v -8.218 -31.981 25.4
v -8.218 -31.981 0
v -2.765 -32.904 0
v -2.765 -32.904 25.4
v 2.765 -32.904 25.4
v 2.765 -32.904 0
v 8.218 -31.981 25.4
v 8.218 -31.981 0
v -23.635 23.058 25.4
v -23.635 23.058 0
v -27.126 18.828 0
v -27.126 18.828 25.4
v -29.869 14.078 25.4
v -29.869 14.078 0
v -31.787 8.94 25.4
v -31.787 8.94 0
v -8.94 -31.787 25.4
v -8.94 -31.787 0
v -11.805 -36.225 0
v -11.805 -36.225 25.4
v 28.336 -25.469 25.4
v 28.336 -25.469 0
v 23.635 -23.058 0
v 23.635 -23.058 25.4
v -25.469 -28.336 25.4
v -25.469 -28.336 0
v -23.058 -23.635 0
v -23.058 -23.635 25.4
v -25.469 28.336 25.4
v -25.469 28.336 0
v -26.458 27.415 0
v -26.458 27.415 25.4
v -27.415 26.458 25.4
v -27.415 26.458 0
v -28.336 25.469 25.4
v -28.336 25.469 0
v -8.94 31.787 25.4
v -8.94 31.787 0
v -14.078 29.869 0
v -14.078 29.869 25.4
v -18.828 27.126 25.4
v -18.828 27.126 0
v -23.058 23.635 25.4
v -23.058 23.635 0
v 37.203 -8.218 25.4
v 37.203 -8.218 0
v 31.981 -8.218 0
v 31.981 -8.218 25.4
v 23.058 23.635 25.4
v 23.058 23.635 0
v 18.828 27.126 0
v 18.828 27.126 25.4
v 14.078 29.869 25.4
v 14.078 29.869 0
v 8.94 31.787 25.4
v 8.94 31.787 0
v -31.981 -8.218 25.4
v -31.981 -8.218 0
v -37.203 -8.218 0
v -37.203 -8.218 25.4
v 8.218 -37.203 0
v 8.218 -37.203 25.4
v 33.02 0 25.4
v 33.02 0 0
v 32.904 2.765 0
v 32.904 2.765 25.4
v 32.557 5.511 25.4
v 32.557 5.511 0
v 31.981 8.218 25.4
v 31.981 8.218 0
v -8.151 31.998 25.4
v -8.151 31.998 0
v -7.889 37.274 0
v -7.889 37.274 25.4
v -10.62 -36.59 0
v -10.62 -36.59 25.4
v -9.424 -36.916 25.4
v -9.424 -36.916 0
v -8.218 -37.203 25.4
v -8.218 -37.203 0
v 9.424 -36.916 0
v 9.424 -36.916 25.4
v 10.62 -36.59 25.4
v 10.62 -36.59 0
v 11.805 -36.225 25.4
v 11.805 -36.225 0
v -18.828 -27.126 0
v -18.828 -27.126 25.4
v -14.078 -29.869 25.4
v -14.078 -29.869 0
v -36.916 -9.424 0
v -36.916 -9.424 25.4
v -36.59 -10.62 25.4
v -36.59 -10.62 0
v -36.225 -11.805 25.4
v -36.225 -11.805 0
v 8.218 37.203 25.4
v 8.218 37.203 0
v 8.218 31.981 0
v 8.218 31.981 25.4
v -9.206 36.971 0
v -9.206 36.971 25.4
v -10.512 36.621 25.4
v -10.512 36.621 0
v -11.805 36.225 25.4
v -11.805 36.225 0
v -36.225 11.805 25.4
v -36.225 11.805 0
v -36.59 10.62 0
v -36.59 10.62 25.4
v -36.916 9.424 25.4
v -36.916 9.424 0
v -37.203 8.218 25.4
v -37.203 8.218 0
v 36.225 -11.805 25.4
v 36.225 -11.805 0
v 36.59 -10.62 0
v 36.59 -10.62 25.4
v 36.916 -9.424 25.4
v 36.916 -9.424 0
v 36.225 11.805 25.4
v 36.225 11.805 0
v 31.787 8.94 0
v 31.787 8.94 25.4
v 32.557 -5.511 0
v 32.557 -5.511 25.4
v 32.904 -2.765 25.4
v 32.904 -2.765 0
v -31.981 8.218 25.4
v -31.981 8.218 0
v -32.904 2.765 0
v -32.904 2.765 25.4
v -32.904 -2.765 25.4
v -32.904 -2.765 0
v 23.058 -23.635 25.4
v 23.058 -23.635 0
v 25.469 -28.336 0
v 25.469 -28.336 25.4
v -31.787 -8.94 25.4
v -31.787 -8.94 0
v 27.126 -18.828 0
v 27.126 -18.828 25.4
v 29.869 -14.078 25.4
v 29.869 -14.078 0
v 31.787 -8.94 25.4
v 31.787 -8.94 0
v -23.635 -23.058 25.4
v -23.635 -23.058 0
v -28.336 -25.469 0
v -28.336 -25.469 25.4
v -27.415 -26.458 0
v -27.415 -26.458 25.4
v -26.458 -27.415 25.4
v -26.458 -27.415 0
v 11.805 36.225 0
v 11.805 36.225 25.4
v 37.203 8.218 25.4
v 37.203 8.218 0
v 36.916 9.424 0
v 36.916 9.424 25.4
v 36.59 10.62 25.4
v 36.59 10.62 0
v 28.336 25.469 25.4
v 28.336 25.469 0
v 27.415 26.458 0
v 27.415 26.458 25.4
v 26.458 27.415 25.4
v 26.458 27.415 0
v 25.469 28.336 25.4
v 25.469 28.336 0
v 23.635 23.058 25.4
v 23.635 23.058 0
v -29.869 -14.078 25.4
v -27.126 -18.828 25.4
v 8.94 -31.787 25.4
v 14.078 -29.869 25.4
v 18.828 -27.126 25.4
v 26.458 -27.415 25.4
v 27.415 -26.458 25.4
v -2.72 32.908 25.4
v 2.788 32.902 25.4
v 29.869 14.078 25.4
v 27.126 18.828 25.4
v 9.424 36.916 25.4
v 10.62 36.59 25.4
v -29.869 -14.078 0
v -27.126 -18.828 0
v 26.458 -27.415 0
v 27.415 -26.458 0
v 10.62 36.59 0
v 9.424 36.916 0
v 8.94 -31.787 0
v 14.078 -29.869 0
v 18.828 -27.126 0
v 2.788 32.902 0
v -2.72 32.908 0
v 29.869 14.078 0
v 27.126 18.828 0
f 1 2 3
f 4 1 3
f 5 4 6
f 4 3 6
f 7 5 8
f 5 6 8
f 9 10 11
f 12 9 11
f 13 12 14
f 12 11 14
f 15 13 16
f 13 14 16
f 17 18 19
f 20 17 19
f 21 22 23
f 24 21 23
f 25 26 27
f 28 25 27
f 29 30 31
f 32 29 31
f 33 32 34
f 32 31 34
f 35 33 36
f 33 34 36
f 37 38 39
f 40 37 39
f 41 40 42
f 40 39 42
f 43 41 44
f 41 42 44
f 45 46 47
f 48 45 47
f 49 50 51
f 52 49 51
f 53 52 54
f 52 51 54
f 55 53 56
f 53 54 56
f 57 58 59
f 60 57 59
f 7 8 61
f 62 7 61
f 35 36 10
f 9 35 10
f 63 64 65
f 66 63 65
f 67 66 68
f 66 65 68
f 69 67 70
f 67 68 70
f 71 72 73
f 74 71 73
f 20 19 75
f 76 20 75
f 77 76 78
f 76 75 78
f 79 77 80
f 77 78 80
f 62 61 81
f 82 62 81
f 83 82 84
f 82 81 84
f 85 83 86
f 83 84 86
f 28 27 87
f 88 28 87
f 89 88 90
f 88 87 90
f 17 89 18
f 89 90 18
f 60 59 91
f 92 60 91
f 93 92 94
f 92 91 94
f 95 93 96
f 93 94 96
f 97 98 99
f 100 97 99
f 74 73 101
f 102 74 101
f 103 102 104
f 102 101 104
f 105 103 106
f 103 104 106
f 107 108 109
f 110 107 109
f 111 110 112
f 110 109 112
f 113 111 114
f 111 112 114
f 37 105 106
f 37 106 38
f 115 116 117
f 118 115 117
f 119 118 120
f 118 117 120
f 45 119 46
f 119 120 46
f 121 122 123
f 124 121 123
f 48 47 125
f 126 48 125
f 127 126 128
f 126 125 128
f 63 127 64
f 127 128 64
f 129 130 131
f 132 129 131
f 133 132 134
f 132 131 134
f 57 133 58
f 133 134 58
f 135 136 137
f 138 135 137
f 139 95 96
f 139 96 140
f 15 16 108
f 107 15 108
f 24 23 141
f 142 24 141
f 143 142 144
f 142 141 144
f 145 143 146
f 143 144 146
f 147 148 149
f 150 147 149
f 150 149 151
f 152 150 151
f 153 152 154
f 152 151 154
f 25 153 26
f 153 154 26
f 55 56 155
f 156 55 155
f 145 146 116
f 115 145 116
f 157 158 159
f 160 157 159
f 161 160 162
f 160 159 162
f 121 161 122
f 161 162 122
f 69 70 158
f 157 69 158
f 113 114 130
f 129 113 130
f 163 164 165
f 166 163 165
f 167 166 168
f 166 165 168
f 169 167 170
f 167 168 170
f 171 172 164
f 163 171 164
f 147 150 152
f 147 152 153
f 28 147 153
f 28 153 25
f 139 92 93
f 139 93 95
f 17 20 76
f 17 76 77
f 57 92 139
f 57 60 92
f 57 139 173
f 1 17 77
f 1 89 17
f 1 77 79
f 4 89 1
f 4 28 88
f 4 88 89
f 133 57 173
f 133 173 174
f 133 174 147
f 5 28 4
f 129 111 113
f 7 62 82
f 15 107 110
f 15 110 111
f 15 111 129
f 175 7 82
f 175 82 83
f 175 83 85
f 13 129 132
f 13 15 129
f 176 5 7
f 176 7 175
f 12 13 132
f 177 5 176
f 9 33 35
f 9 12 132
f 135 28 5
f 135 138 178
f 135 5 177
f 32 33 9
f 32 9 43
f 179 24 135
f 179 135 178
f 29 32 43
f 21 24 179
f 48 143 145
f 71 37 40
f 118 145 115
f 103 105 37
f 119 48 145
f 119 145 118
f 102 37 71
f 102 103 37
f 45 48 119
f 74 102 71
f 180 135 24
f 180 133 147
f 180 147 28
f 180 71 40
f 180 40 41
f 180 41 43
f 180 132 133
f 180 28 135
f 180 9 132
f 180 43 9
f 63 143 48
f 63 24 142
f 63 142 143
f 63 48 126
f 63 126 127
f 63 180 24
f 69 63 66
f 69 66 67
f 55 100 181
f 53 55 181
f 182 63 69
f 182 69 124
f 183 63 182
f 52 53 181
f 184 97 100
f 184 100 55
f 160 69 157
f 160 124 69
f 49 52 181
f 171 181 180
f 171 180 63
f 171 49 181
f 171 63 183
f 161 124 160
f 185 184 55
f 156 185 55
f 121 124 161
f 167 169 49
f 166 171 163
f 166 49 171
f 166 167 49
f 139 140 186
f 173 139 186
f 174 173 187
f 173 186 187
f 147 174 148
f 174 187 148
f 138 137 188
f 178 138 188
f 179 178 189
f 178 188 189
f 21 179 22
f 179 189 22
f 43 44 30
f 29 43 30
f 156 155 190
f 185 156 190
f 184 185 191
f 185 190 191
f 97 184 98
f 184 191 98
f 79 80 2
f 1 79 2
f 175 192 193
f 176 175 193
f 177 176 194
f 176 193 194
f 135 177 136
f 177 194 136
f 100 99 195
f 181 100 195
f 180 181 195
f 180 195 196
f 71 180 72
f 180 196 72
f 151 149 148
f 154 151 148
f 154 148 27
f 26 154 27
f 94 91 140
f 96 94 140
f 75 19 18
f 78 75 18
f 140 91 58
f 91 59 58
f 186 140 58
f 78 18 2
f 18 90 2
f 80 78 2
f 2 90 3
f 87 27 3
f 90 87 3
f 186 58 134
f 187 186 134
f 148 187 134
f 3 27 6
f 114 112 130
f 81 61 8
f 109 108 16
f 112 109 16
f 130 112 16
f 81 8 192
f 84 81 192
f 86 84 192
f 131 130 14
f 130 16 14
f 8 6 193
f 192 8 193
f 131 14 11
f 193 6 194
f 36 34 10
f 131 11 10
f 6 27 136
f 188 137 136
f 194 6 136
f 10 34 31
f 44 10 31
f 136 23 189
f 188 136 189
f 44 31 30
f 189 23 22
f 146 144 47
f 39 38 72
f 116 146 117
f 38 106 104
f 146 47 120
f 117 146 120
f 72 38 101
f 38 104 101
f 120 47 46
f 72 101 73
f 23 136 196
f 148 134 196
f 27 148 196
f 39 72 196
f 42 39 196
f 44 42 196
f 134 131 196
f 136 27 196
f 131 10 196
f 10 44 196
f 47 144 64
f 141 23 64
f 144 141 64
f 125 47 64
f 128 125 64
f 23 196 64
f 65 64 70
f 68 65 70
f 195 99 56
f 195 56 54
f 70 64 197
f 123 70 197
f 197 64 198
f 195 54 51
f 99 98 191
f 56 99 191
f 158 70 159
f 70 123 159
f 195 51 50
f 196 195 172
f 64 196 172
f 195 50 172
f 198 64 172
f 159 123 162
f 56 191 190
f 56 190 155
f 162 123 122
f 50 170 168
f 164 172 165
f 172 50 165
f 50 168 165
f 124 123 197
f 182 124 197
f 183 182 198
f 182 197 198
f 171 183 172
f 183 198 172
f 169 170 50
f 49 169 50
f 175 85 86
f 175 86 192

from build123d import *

# Parameters (mm, degrees)
F1_DEPTH = 25.4


# Not quite as in the source:
# - a feature names something its author has since deleted; it is built from what else it names


with BuildPart() as f1:
    # F0 (on Top) → F1 (new body)
    with BuildSketch(Plane.XY):
        with BuildLine():
            Line((31.981135327, 8.217504682), (37.2032608356, 8.217504682))
            ThreePointArc((37.2032608356, 8.217504682), (36.7578953368, 10.0233293076), (36.2249315604, 11.8052671906))
            Line((36.2249315604, 11.8052671906), (31.7868036802, 8.9397713505))
            ThreePointArc((31.7868036802, 8.9397713505), (31.8860146238, 8.5791882723), (31.981135327, 8.217504682))
        make_face()
        with BuildLine():
            ThreePointArc((36.2249315604, -11.8052671906), (36.7578953368, -10.0233293076), (37.2032608356, -8.217504682))
            Line((37.2032608356, -8.217504682), (31.981135327, -8.217504682))
            ThreePointArc((31.981135327, -8.217504682), (31.8860146238, -8.5791882723), (31.7868036802, -8.9397713505))
            Line((31.7868036802, -8.9397713505), (36.2249315604, -11.8052671906))
        make_face()
        with BuildLine():
            ThreePointArc((33.02, 0), (32.7592543299, 4.1414557527), (31.981135327, 8.217504682))
            Line((31.981135327, 8.217504682), (30.6681449847, 8.217504682))
            ThreePointArc((30.6681449847, 8.217504682), (31.4783743486, 4.144206603), (31.75, 0))
            ThreePointArc((31.75, 0), (31.4783743486, -4.144206603), (30.6681449847, -8.217504682))
            Line((30.6681449847, -8.217504682), (31.981135327, -8.217504682))
            ThreePointArc((31.981135327, -8.217504682), (32.7592543299, -4.1414557527), (33.02, 0))
        make_face()
        with BuildLine():
            Line((30.6681449847, 8.217504682), (31.981135327, 8.217504682))
            ThreePointArc((31.981135327, 8.217504682), (31.8860146238, 8.5791882723), (31.7868036802, 8.9397713505))
            Line((31.7868036802, 8.9397713505), (30.6681449847, 8.217504682))
        make_face()
        with BuildLine():
            ThreePointArc((31.7868036802, -8.9397713505), (31.8860146238, -8.5791882723), (31.981135327, -8.217504682))
            Line((31.981135327, -8.217504682), (30.6681449847, -8.217504682))
            Line((30.6681449847, -8.217504682), (31.7868036802, -8.9397713505))
        make_face()
        with BuildLine():
            Line((23.6354709336, 23.0582938169), (28.3361270657, 25.4690773864))
            ThreePointArc((28.3361270657, 25.4690773864), (26.9407683632, 26.9407683632), (25.4690773864, 28.3361270657))
            Line((25.4690773864, 28.3361270657), (23.0582938169, 23.6354709336))
            ThreePointArc((23.0582938169, 23.6354709336), (23.3486659148, 23.3486659148), (23.6354709336, 23.0582938169))
        make_face()
        with BuildLine():
            Line((30.6681449847, 8.217504682), (31.7868036802, 8.9397713505))
            ThreePointArc((31.7868036802, 8.9397713505), (28.596158833, 16.51), (23.6354709336, 23.0582938169))
            Line((23.6354709336, 23.0582938169), (22.4506403027, 22.4506403027))
            ThreePointArc((22.4506403027, 22.4506403027), (27.4963065702, 15.875), (30.6681449847, 8.217504682))
        make_face()
        with BuildLine():
            ThreePointArc((31.75, 0), (31.4783743486, 4.144206603), (30.6681449847, 8.217504682))
            ThreePointArc((30.6681449847, 8.217504682), (27.4963065702, 15.875), (22.4506403027, 22.4506403027))
            ThreePointArc((22.4506403027, 22.4506403027), (15.875, 27.4963065702), (8.217504682, 30.6681449847))
            ThreePointArc((8.217504682, 30.6681449847), (0, 31.75), (-8.217504682, 30.6681449847))
            ThreePointArc((-8.217504682, 30.6681449847), (-15.875, 27.4963065702), (-22.4506403027, 22.4506403027))
            ThreePointArc((-22.4506403027, 22.4506403027), (-27.4963065702, 15.875), (-30.6681449847, 8.217504682))
            ThreePointArc((-30.6681449847, 8.217504682), (-31.75, 0), (-30.6681449847, -8.217504682))
            ThreePointArc((-30.6681449847, -8.217504682), (-27.4963065702, -15.875), (-22.4506403027, -22.4506403027))
            ThreePointArc((-22.4506403027, -22.4506403027), (-15.875, -27.4963065702), (-8.217504682, -30.6681449847))
            ThreePointArc((-8.217504682, -30.6681449847), (0, -31.75), (8.217504682, -30.6681449847))
            ThreePointArc((8.217504682, -30.6681449847), (15.875, -27.4963065702), (22.4506403027, -22.4506403027))
            ThreePointArc((22.4506403027, -22.4506403027), (27.4963065702, -15.875), (30.6681449847, -8.217504682))
            ThreePointArc((30.6681449847, -8.217504682), (31.4783743486, -4.144206603), (31.75, 0))
        make_face()
        with BuildLine():
            ThreePointArc((25.4690773864, -28.3361270657), (26.9407683632, -26.9407683632), (28.3361270657, -25.4690773864))
            Line((28.3361270657, -25.4690773864), (23.6354709336, -23.0582938169))
            ThreePointArc((23.6354709336, -23.0582938169), (23.3486659148, -23.3486659148), (23.0582938169, -23.6354709336))
            Line((23.0582938169, -23.6354709336), (25.4690773864, -28.3361270657))
        make_face()
        with BuildLine():
            ThreePointArc((23.6354709336, -23.0582938169), (28.596158833, -16.51), (31.7868036802, -8.9397713505))
            Line((31.7868036802, -8.9397713505), (30.6681449847, -8.217504682))
            ThreePointArc((30.6681449847, -8.217504682), (27.4963065702, -15.875), (22.4506403027, -22.4506403027))
            Line((22.4506403027, -22.4506403027), (23.6354709336, -23.0582938169))
        make_face()
        with BuildLine():
            Line((22.4506403027, 22.4506403027), (23.6354709336, 23.0582938169))
            ThreePointArc((23.6354709336, 23.0582938169), (23.3486659148, 23.3486659148), (23.0582938169, 23.6354709336))
            Line((23.0582938169, 23.6354709336), (22.4506403027, 22.4506403027))
        make_face()
        with BuildLine():
            ThreePointArc((8.217504682, 30.6681449847), (15.875, 27.4963065702), (22.4506403027, 22.4506403027))
            Line((22.4506403027, 22.4506403027), (23.0582938169, 23.6354709336))
            ThreePointArc((23.0582938169, 23.6354709336), (16.51, 28.596158833), (8.9397713505, 31.7868036802))
            Line((8.9397713505, 31.7868036802), (8.217504682, 30.6681449847))
        make_face()
        with BuildLine():
            ThreePointArc((23.0582938169, -23.6354709336), (23.3486659148, -23.3486659148), (23.6354709336, -23.0582938169))
            Line((23.6354709336, -23.0582938169), (22.4506403027, -22.4506403027))
            Line((22.4506403027, -22.4506403027), (23.0582938169, -23.6354709336))
        make_face()
        with BuildLine():
            Line((23.0582938169, -23.6354709336), (22.4506403027, -22.4506403027))
            ThreePointArc((22.4506403027, -22.4506403027), (15.875, -27.4963065702), (8.217504682, -30.6681449847))
            Line((8.217504682, -30.6681449847), (8.9397713505, -31.7868036802))
            ThreePointArc((8.9397713505, -31.7868036802), (16.51, -28.596158833), (23.0582938169, -23.6354709336))
        make_face()
        with BuildLine():
            Line((8.9397713505, 31.7868036802), (11.8052671906, 36.2249315604))
            ThreePointArc((11.8052671906, 36.2249315604), (10.0233293076, 36.7578953368), (8.217504682, 37.2032608356))
            Line((8.217504682, 37.2032608356), (8.217504682, 31.981135327))
            ThreePointArc((8.217504682, 31.981135327), (8.5791882723, 31.8860146238), (8.9397713505, 31.7868036802))
        make_face()
        with BuildLine():
            Line((8.217504682, 31.981135327), (8.217504682, 30.6681449847))
            Line((8.217504682, 30.6681449847), (8.9397713505, 31.7868036802))
            ThreePointArc((8.9397713505, 31.7868036802), (8.5791882723, 31.8860146238), (8.217504682, 31.981135327))
        make_face()
        with BuildLine():
            ThreePointArc((-8.217504682, 30.6681449847), (0, 31.75), (8.217504682, 30.6681449847))
            Line((8.217504682, 30.6681449847), (8.217504682, 31.981135327))
            ThreePointArc((8.217504682, 31.981135327), (0.0341516637, 33.0199823389), (-8.1513327465, 31.9980651674))
            Line((-8.1513327465, 31.9980651674), (-8.217504682, 30.6681449847))
        make_face()
        with BuildLine():
            ThreePointArc((8.217504682, -37.2032608356), (10.0233293076, -36.7578953368), (11.8052671906, -36.2249315604))
            Line((11.8052671906, -36.2249315604), (8.9397713505, -31.7868036802))
            ThreePointArc((8.9397713505, -31.7868036802), (8.5791882723, -31.8860146238), (8.217504682, -31.981135327))
            Line((8.217504682, -31.981135327), (8.217504682, -37.2032608356))
        make_face()
        with BuildLine():
            Line((8.217504682, -31.981135327), (8.217504682, -30.6681449847))
            ThreePointArc((8.217504682, -30.6681449847), (0, -31.75), (-8.217504682, -30.6681449847))
            Line((-8.217504682, -30.6681449847), (-8.217504682, -31.981135327))
            ThreePointArc((-8.217504682, -31.981135327), (0, -33.02), (8.217504682, -31.981135327))
        make_face()
        with BuildLine():
            Line((8.9397713505, -31.7868036802), (8.217504682, -30.6681449847))
            Line((8.217504682, -30.6681449847), (8.217504682, -31.981135327))
            ThreePointArc((8.217504682, -31.981135327), (8.5791882723, -31.8860146238), (8.9397713505, -31.7868036802))
        make_face()
        with BuildLine():
            Line((-8.9397713505, 31.7868036802), (-8.217504682, 30.6681449847))
            Line((-8.217504682, 30.6681449847), (-8.1513327465, 31.9980651674))
            ThreePointArc((-8.1513327465, 31.9980651674), (-8.5462048693, 31.8948707841), (-8.9397713505, 31.7868036802))
        make_face()
        with BuildLine():
            ThreePointArc((-22.4506403027, 22.4506403027), (-15.875, 27.4963065702), (-8.217504682, 30.6681449847))
            Line((-8.217504682, 30.6681449847), (-8.9397713505, 31.7868036802))
            ThreePointArc((-8.9397713505, 31.7868036802), (-16.51, 28.596158833), (-23.0582938169, 23.6354709336))
            Line((-23.0582938169, 23.6354709336), (-22.4506403027, 22.4506403027))
        make_face()
        with BuildLine():
            Line((-8.9397713505, -31.7868036802), (-8.217504682, -30.6681449847))
            ThreePointArc((-8.217504682, -30.6681449847), (-15.875, -27.4963065702), (-22.4506403027, -22.4506403027))
            Line((-22.4506403027, -22.4506403027), (-23.0582938169, -23.6354709336))
            ThreePointArc((-23.0582938169, -23.6354709336), (-16.51, -28.596158833), (-8.9397713505, -31.7868036802))
        make_face()
        with BuildLine():
            Line((-8.217504682, -31.981135327), (-8.217504682, -30.6681449847))
            Line((-8.217504682, -30.6681449847), (-8.9397713505, -31.7868036802))
            ThreePointArc((-8.9397713505, -31.7868036802), (-8.5791882723, -31.8860146238), (-8.217504682, -31.981135327))
        make_face()
        with BuildLine():
            Line((-8.1513327465, 31.9980651674), (-7.8888044947, 37.274344577))
            ThreePointArc((-7.8888044947, 37.274344577), (-9.8610056184, 36.8017739816), (-11.8052671906, 36.2249315604))
            Line((-11.8052671906, 36.2249315604), (-8.9397713505, 31.7868036802))
            ThreePointArc((-8.9397713505, 31.7868036802), (-8.5462048693, 31.8948707841), (-8.1513327465, 31.9980651674))
        make_face()
        with BuildLine():
            Line((-23.6354709336, 23.0582938169), (-22.4506403027, 22.4506403027))
            Line((-22.4506403027, 22.4506403027), (-23.0582938169, 23.6354709336))
            ThreePointArc((-23.0582938169, 23.6354709336), (-23.3486659148, 23.3486659148), (-23.6354709336, 23.0582938169))
        make_face()
        with BuildLine():
            ThreePointArc((-30.6681449847, 8.217504682), (-27.4963065702, 15.875), (-22.4506403027, 22.4506403027))
            Line((-22.4506403027, 22.4506403027), (-23.6354709336, 23.0582938169))
            ThreePointArc((-23.6354709336, 23.0582938169), (-28.596158833, 16.51), (-31.7868036802, 8.9397713505))
            Line((-31.7868036802, 8.9397713505), (-30.6681449847, 8.217504682))
        make_face()
        with BuildLine():
            ThreePointArc((-11.8052671906, -36.2249315604), (-10.0233293076, -36.7578953368), (-8.217504682, -37.2032608356))
            Line((-8.217504682, -37.2032608356), (-8.217504682, -31.981135327))
            ThreePointArc((-8.217504682, -31.981135327), (-8.5791882723, -31.8860146238), (-8.9397713505, -31.7868036802))
            Line((-8.9397713505, -31.7868036802), (-11.8052671906, -36.2249315604))
        make_face()
        with BuildLine():
            Line((-23.6354709336, -23.0582938169), (-22.4506403027, -22.4506403027))
            ThreePointArc((-22.4506403027, -22.4506403027), (-27.4963065702, -15.875), (-30.6681449847, -8.217504682))
            Line((-30.6681449847, -8.217504682), (-31.7868036802, -8.9397713505))
            ThreePointArc((-31.7868036802, -8.9397713505), (-28.596158833, -16.51), (-23.6354709336, -23.0582938169))
        make_face()
        with BuildLine():
            Line((-23.0582938169, -23.6354709336), (-22.4506403027, -22.4506403027))
            Line((-22.4506403027, -22.4506403027), (-23.6354709336, -23.0582938169))
            ThreePointArc((-23.6354709336, -23.0582938169), (-23.3486659148, -23.3486659148), (-23.0582938169, -23.6354709336))
        make_face()
        with BuildLine():
            Line((-31.981135327, 8.217504682), (-30.6681449847, 8.217504682))
            Line((-30.6681449847, 8.217504682), (-31.7868036802, 8.9397713505))
            ThreePointArc((-31.7868036802, 8.9397713505), (-31.8860146238, 8.5791882723), (-31.981135327, 8.217504682))
        make_face()
        with BuildLine():
            ThreePointArc((-30.6681449847, -8.217504682), (-31.75, 0), (-30.6681449847, 8.217504682))
            Line((-30.6681449847, 8.217504682), (-31.981135327, 8.217504682))
            ThreePointArc((-31.981135327, 8.217504682), (-33.02, 0), (-31.981135327, -8.217504682))
            Line((-31.981135327, -8.217504682), (-30.6681449847, -8.217504682))
        make_face()
        with BuildLine():
            ThreePointArc((-23.6354709336, 23.0582938169), (-23.3486659148, 23.3486659148), (-23.0582938169, 23.6354709336))
            Line((-23.0582938169, 23.6354709336), (-25.4690773864, 28.3361270657))
            ThreePointArc((-25.4690773864, 28.3361270657), (-26.9407683632, 26.9407683632), (-28.3361270657, 25.4690773864))
            Line((-28.3361270657, 25.4690773864), (-23.6354709336, 23.0582938169))
        make_face()
        with BuildLine():
            Line((-31.7868036802, -8.9397713505), (-30.6681449847, -8.217504682))
            Line((-30.6681449847, -8.217504682), (-31.981135327, -8.217504682))
            ThreePointArc((-31.981135327, -8.217504682), (-31.8860146238, -8.5791882723), (-31.7868036802, -8.9397713505))
        make_face()
        with BuildLine():
            Line((-25.4690773864, -28.3361270657), (-23.0582938169, -23.6354709336))
            ThreePointArc((-23.0582938169, -23.6354709336), (-23.3486659148, -23.3486659148), (-23.6354709336, -23.0582938169))
            Line((-23.6354709336, -23.0582938169), (-28.3361270657, -25.4690773864))
            ThreePointArc((-28.3361270657, -25.4690773864), (-26.9407683632, -26.9407683632), (-25.4690773864, -28.3361270657))
        make_face()
        with BuildLine():
            ThreePointArc((-31.981135327, 8.217504682), (-31.8860146238, 8.5791882723), (-31.7868036802, 8.9397713505))
            Line((-31.7868036802, 8.9397713505), (-36.2249315604, 11.8052671906))
            ThreePointArc((-36.2249315604, 11.8052671906), (-36.7578953368, 10.0233293076), (-37.2032608356, 8.217504682))
            Line((-37.2032608356, 8.217504682), (-31.981135327, 8.217504682))
        make_face()
        with BuildLine():
            Line((-36.2249315604, -11.8052671906), (-31.7868036802, -8.9397713505))
            ThreePointArc((-31.7868036802, -8.9397713505), (-31.8860146238, -8.5791882723), (-31.981135327, -8.217504682))
            Line((-31.981135327, -8.217504682), (-37.2032608356, -8.217504682))
            ThreePointArc((-37.2032608356, -8.217504682), (-36.7578953368, -10.0233293076), (-36.2249315604, -11.8052671906))
        make_face()
    extrude(amount=F1_DEPTH)


solid = f1.part
